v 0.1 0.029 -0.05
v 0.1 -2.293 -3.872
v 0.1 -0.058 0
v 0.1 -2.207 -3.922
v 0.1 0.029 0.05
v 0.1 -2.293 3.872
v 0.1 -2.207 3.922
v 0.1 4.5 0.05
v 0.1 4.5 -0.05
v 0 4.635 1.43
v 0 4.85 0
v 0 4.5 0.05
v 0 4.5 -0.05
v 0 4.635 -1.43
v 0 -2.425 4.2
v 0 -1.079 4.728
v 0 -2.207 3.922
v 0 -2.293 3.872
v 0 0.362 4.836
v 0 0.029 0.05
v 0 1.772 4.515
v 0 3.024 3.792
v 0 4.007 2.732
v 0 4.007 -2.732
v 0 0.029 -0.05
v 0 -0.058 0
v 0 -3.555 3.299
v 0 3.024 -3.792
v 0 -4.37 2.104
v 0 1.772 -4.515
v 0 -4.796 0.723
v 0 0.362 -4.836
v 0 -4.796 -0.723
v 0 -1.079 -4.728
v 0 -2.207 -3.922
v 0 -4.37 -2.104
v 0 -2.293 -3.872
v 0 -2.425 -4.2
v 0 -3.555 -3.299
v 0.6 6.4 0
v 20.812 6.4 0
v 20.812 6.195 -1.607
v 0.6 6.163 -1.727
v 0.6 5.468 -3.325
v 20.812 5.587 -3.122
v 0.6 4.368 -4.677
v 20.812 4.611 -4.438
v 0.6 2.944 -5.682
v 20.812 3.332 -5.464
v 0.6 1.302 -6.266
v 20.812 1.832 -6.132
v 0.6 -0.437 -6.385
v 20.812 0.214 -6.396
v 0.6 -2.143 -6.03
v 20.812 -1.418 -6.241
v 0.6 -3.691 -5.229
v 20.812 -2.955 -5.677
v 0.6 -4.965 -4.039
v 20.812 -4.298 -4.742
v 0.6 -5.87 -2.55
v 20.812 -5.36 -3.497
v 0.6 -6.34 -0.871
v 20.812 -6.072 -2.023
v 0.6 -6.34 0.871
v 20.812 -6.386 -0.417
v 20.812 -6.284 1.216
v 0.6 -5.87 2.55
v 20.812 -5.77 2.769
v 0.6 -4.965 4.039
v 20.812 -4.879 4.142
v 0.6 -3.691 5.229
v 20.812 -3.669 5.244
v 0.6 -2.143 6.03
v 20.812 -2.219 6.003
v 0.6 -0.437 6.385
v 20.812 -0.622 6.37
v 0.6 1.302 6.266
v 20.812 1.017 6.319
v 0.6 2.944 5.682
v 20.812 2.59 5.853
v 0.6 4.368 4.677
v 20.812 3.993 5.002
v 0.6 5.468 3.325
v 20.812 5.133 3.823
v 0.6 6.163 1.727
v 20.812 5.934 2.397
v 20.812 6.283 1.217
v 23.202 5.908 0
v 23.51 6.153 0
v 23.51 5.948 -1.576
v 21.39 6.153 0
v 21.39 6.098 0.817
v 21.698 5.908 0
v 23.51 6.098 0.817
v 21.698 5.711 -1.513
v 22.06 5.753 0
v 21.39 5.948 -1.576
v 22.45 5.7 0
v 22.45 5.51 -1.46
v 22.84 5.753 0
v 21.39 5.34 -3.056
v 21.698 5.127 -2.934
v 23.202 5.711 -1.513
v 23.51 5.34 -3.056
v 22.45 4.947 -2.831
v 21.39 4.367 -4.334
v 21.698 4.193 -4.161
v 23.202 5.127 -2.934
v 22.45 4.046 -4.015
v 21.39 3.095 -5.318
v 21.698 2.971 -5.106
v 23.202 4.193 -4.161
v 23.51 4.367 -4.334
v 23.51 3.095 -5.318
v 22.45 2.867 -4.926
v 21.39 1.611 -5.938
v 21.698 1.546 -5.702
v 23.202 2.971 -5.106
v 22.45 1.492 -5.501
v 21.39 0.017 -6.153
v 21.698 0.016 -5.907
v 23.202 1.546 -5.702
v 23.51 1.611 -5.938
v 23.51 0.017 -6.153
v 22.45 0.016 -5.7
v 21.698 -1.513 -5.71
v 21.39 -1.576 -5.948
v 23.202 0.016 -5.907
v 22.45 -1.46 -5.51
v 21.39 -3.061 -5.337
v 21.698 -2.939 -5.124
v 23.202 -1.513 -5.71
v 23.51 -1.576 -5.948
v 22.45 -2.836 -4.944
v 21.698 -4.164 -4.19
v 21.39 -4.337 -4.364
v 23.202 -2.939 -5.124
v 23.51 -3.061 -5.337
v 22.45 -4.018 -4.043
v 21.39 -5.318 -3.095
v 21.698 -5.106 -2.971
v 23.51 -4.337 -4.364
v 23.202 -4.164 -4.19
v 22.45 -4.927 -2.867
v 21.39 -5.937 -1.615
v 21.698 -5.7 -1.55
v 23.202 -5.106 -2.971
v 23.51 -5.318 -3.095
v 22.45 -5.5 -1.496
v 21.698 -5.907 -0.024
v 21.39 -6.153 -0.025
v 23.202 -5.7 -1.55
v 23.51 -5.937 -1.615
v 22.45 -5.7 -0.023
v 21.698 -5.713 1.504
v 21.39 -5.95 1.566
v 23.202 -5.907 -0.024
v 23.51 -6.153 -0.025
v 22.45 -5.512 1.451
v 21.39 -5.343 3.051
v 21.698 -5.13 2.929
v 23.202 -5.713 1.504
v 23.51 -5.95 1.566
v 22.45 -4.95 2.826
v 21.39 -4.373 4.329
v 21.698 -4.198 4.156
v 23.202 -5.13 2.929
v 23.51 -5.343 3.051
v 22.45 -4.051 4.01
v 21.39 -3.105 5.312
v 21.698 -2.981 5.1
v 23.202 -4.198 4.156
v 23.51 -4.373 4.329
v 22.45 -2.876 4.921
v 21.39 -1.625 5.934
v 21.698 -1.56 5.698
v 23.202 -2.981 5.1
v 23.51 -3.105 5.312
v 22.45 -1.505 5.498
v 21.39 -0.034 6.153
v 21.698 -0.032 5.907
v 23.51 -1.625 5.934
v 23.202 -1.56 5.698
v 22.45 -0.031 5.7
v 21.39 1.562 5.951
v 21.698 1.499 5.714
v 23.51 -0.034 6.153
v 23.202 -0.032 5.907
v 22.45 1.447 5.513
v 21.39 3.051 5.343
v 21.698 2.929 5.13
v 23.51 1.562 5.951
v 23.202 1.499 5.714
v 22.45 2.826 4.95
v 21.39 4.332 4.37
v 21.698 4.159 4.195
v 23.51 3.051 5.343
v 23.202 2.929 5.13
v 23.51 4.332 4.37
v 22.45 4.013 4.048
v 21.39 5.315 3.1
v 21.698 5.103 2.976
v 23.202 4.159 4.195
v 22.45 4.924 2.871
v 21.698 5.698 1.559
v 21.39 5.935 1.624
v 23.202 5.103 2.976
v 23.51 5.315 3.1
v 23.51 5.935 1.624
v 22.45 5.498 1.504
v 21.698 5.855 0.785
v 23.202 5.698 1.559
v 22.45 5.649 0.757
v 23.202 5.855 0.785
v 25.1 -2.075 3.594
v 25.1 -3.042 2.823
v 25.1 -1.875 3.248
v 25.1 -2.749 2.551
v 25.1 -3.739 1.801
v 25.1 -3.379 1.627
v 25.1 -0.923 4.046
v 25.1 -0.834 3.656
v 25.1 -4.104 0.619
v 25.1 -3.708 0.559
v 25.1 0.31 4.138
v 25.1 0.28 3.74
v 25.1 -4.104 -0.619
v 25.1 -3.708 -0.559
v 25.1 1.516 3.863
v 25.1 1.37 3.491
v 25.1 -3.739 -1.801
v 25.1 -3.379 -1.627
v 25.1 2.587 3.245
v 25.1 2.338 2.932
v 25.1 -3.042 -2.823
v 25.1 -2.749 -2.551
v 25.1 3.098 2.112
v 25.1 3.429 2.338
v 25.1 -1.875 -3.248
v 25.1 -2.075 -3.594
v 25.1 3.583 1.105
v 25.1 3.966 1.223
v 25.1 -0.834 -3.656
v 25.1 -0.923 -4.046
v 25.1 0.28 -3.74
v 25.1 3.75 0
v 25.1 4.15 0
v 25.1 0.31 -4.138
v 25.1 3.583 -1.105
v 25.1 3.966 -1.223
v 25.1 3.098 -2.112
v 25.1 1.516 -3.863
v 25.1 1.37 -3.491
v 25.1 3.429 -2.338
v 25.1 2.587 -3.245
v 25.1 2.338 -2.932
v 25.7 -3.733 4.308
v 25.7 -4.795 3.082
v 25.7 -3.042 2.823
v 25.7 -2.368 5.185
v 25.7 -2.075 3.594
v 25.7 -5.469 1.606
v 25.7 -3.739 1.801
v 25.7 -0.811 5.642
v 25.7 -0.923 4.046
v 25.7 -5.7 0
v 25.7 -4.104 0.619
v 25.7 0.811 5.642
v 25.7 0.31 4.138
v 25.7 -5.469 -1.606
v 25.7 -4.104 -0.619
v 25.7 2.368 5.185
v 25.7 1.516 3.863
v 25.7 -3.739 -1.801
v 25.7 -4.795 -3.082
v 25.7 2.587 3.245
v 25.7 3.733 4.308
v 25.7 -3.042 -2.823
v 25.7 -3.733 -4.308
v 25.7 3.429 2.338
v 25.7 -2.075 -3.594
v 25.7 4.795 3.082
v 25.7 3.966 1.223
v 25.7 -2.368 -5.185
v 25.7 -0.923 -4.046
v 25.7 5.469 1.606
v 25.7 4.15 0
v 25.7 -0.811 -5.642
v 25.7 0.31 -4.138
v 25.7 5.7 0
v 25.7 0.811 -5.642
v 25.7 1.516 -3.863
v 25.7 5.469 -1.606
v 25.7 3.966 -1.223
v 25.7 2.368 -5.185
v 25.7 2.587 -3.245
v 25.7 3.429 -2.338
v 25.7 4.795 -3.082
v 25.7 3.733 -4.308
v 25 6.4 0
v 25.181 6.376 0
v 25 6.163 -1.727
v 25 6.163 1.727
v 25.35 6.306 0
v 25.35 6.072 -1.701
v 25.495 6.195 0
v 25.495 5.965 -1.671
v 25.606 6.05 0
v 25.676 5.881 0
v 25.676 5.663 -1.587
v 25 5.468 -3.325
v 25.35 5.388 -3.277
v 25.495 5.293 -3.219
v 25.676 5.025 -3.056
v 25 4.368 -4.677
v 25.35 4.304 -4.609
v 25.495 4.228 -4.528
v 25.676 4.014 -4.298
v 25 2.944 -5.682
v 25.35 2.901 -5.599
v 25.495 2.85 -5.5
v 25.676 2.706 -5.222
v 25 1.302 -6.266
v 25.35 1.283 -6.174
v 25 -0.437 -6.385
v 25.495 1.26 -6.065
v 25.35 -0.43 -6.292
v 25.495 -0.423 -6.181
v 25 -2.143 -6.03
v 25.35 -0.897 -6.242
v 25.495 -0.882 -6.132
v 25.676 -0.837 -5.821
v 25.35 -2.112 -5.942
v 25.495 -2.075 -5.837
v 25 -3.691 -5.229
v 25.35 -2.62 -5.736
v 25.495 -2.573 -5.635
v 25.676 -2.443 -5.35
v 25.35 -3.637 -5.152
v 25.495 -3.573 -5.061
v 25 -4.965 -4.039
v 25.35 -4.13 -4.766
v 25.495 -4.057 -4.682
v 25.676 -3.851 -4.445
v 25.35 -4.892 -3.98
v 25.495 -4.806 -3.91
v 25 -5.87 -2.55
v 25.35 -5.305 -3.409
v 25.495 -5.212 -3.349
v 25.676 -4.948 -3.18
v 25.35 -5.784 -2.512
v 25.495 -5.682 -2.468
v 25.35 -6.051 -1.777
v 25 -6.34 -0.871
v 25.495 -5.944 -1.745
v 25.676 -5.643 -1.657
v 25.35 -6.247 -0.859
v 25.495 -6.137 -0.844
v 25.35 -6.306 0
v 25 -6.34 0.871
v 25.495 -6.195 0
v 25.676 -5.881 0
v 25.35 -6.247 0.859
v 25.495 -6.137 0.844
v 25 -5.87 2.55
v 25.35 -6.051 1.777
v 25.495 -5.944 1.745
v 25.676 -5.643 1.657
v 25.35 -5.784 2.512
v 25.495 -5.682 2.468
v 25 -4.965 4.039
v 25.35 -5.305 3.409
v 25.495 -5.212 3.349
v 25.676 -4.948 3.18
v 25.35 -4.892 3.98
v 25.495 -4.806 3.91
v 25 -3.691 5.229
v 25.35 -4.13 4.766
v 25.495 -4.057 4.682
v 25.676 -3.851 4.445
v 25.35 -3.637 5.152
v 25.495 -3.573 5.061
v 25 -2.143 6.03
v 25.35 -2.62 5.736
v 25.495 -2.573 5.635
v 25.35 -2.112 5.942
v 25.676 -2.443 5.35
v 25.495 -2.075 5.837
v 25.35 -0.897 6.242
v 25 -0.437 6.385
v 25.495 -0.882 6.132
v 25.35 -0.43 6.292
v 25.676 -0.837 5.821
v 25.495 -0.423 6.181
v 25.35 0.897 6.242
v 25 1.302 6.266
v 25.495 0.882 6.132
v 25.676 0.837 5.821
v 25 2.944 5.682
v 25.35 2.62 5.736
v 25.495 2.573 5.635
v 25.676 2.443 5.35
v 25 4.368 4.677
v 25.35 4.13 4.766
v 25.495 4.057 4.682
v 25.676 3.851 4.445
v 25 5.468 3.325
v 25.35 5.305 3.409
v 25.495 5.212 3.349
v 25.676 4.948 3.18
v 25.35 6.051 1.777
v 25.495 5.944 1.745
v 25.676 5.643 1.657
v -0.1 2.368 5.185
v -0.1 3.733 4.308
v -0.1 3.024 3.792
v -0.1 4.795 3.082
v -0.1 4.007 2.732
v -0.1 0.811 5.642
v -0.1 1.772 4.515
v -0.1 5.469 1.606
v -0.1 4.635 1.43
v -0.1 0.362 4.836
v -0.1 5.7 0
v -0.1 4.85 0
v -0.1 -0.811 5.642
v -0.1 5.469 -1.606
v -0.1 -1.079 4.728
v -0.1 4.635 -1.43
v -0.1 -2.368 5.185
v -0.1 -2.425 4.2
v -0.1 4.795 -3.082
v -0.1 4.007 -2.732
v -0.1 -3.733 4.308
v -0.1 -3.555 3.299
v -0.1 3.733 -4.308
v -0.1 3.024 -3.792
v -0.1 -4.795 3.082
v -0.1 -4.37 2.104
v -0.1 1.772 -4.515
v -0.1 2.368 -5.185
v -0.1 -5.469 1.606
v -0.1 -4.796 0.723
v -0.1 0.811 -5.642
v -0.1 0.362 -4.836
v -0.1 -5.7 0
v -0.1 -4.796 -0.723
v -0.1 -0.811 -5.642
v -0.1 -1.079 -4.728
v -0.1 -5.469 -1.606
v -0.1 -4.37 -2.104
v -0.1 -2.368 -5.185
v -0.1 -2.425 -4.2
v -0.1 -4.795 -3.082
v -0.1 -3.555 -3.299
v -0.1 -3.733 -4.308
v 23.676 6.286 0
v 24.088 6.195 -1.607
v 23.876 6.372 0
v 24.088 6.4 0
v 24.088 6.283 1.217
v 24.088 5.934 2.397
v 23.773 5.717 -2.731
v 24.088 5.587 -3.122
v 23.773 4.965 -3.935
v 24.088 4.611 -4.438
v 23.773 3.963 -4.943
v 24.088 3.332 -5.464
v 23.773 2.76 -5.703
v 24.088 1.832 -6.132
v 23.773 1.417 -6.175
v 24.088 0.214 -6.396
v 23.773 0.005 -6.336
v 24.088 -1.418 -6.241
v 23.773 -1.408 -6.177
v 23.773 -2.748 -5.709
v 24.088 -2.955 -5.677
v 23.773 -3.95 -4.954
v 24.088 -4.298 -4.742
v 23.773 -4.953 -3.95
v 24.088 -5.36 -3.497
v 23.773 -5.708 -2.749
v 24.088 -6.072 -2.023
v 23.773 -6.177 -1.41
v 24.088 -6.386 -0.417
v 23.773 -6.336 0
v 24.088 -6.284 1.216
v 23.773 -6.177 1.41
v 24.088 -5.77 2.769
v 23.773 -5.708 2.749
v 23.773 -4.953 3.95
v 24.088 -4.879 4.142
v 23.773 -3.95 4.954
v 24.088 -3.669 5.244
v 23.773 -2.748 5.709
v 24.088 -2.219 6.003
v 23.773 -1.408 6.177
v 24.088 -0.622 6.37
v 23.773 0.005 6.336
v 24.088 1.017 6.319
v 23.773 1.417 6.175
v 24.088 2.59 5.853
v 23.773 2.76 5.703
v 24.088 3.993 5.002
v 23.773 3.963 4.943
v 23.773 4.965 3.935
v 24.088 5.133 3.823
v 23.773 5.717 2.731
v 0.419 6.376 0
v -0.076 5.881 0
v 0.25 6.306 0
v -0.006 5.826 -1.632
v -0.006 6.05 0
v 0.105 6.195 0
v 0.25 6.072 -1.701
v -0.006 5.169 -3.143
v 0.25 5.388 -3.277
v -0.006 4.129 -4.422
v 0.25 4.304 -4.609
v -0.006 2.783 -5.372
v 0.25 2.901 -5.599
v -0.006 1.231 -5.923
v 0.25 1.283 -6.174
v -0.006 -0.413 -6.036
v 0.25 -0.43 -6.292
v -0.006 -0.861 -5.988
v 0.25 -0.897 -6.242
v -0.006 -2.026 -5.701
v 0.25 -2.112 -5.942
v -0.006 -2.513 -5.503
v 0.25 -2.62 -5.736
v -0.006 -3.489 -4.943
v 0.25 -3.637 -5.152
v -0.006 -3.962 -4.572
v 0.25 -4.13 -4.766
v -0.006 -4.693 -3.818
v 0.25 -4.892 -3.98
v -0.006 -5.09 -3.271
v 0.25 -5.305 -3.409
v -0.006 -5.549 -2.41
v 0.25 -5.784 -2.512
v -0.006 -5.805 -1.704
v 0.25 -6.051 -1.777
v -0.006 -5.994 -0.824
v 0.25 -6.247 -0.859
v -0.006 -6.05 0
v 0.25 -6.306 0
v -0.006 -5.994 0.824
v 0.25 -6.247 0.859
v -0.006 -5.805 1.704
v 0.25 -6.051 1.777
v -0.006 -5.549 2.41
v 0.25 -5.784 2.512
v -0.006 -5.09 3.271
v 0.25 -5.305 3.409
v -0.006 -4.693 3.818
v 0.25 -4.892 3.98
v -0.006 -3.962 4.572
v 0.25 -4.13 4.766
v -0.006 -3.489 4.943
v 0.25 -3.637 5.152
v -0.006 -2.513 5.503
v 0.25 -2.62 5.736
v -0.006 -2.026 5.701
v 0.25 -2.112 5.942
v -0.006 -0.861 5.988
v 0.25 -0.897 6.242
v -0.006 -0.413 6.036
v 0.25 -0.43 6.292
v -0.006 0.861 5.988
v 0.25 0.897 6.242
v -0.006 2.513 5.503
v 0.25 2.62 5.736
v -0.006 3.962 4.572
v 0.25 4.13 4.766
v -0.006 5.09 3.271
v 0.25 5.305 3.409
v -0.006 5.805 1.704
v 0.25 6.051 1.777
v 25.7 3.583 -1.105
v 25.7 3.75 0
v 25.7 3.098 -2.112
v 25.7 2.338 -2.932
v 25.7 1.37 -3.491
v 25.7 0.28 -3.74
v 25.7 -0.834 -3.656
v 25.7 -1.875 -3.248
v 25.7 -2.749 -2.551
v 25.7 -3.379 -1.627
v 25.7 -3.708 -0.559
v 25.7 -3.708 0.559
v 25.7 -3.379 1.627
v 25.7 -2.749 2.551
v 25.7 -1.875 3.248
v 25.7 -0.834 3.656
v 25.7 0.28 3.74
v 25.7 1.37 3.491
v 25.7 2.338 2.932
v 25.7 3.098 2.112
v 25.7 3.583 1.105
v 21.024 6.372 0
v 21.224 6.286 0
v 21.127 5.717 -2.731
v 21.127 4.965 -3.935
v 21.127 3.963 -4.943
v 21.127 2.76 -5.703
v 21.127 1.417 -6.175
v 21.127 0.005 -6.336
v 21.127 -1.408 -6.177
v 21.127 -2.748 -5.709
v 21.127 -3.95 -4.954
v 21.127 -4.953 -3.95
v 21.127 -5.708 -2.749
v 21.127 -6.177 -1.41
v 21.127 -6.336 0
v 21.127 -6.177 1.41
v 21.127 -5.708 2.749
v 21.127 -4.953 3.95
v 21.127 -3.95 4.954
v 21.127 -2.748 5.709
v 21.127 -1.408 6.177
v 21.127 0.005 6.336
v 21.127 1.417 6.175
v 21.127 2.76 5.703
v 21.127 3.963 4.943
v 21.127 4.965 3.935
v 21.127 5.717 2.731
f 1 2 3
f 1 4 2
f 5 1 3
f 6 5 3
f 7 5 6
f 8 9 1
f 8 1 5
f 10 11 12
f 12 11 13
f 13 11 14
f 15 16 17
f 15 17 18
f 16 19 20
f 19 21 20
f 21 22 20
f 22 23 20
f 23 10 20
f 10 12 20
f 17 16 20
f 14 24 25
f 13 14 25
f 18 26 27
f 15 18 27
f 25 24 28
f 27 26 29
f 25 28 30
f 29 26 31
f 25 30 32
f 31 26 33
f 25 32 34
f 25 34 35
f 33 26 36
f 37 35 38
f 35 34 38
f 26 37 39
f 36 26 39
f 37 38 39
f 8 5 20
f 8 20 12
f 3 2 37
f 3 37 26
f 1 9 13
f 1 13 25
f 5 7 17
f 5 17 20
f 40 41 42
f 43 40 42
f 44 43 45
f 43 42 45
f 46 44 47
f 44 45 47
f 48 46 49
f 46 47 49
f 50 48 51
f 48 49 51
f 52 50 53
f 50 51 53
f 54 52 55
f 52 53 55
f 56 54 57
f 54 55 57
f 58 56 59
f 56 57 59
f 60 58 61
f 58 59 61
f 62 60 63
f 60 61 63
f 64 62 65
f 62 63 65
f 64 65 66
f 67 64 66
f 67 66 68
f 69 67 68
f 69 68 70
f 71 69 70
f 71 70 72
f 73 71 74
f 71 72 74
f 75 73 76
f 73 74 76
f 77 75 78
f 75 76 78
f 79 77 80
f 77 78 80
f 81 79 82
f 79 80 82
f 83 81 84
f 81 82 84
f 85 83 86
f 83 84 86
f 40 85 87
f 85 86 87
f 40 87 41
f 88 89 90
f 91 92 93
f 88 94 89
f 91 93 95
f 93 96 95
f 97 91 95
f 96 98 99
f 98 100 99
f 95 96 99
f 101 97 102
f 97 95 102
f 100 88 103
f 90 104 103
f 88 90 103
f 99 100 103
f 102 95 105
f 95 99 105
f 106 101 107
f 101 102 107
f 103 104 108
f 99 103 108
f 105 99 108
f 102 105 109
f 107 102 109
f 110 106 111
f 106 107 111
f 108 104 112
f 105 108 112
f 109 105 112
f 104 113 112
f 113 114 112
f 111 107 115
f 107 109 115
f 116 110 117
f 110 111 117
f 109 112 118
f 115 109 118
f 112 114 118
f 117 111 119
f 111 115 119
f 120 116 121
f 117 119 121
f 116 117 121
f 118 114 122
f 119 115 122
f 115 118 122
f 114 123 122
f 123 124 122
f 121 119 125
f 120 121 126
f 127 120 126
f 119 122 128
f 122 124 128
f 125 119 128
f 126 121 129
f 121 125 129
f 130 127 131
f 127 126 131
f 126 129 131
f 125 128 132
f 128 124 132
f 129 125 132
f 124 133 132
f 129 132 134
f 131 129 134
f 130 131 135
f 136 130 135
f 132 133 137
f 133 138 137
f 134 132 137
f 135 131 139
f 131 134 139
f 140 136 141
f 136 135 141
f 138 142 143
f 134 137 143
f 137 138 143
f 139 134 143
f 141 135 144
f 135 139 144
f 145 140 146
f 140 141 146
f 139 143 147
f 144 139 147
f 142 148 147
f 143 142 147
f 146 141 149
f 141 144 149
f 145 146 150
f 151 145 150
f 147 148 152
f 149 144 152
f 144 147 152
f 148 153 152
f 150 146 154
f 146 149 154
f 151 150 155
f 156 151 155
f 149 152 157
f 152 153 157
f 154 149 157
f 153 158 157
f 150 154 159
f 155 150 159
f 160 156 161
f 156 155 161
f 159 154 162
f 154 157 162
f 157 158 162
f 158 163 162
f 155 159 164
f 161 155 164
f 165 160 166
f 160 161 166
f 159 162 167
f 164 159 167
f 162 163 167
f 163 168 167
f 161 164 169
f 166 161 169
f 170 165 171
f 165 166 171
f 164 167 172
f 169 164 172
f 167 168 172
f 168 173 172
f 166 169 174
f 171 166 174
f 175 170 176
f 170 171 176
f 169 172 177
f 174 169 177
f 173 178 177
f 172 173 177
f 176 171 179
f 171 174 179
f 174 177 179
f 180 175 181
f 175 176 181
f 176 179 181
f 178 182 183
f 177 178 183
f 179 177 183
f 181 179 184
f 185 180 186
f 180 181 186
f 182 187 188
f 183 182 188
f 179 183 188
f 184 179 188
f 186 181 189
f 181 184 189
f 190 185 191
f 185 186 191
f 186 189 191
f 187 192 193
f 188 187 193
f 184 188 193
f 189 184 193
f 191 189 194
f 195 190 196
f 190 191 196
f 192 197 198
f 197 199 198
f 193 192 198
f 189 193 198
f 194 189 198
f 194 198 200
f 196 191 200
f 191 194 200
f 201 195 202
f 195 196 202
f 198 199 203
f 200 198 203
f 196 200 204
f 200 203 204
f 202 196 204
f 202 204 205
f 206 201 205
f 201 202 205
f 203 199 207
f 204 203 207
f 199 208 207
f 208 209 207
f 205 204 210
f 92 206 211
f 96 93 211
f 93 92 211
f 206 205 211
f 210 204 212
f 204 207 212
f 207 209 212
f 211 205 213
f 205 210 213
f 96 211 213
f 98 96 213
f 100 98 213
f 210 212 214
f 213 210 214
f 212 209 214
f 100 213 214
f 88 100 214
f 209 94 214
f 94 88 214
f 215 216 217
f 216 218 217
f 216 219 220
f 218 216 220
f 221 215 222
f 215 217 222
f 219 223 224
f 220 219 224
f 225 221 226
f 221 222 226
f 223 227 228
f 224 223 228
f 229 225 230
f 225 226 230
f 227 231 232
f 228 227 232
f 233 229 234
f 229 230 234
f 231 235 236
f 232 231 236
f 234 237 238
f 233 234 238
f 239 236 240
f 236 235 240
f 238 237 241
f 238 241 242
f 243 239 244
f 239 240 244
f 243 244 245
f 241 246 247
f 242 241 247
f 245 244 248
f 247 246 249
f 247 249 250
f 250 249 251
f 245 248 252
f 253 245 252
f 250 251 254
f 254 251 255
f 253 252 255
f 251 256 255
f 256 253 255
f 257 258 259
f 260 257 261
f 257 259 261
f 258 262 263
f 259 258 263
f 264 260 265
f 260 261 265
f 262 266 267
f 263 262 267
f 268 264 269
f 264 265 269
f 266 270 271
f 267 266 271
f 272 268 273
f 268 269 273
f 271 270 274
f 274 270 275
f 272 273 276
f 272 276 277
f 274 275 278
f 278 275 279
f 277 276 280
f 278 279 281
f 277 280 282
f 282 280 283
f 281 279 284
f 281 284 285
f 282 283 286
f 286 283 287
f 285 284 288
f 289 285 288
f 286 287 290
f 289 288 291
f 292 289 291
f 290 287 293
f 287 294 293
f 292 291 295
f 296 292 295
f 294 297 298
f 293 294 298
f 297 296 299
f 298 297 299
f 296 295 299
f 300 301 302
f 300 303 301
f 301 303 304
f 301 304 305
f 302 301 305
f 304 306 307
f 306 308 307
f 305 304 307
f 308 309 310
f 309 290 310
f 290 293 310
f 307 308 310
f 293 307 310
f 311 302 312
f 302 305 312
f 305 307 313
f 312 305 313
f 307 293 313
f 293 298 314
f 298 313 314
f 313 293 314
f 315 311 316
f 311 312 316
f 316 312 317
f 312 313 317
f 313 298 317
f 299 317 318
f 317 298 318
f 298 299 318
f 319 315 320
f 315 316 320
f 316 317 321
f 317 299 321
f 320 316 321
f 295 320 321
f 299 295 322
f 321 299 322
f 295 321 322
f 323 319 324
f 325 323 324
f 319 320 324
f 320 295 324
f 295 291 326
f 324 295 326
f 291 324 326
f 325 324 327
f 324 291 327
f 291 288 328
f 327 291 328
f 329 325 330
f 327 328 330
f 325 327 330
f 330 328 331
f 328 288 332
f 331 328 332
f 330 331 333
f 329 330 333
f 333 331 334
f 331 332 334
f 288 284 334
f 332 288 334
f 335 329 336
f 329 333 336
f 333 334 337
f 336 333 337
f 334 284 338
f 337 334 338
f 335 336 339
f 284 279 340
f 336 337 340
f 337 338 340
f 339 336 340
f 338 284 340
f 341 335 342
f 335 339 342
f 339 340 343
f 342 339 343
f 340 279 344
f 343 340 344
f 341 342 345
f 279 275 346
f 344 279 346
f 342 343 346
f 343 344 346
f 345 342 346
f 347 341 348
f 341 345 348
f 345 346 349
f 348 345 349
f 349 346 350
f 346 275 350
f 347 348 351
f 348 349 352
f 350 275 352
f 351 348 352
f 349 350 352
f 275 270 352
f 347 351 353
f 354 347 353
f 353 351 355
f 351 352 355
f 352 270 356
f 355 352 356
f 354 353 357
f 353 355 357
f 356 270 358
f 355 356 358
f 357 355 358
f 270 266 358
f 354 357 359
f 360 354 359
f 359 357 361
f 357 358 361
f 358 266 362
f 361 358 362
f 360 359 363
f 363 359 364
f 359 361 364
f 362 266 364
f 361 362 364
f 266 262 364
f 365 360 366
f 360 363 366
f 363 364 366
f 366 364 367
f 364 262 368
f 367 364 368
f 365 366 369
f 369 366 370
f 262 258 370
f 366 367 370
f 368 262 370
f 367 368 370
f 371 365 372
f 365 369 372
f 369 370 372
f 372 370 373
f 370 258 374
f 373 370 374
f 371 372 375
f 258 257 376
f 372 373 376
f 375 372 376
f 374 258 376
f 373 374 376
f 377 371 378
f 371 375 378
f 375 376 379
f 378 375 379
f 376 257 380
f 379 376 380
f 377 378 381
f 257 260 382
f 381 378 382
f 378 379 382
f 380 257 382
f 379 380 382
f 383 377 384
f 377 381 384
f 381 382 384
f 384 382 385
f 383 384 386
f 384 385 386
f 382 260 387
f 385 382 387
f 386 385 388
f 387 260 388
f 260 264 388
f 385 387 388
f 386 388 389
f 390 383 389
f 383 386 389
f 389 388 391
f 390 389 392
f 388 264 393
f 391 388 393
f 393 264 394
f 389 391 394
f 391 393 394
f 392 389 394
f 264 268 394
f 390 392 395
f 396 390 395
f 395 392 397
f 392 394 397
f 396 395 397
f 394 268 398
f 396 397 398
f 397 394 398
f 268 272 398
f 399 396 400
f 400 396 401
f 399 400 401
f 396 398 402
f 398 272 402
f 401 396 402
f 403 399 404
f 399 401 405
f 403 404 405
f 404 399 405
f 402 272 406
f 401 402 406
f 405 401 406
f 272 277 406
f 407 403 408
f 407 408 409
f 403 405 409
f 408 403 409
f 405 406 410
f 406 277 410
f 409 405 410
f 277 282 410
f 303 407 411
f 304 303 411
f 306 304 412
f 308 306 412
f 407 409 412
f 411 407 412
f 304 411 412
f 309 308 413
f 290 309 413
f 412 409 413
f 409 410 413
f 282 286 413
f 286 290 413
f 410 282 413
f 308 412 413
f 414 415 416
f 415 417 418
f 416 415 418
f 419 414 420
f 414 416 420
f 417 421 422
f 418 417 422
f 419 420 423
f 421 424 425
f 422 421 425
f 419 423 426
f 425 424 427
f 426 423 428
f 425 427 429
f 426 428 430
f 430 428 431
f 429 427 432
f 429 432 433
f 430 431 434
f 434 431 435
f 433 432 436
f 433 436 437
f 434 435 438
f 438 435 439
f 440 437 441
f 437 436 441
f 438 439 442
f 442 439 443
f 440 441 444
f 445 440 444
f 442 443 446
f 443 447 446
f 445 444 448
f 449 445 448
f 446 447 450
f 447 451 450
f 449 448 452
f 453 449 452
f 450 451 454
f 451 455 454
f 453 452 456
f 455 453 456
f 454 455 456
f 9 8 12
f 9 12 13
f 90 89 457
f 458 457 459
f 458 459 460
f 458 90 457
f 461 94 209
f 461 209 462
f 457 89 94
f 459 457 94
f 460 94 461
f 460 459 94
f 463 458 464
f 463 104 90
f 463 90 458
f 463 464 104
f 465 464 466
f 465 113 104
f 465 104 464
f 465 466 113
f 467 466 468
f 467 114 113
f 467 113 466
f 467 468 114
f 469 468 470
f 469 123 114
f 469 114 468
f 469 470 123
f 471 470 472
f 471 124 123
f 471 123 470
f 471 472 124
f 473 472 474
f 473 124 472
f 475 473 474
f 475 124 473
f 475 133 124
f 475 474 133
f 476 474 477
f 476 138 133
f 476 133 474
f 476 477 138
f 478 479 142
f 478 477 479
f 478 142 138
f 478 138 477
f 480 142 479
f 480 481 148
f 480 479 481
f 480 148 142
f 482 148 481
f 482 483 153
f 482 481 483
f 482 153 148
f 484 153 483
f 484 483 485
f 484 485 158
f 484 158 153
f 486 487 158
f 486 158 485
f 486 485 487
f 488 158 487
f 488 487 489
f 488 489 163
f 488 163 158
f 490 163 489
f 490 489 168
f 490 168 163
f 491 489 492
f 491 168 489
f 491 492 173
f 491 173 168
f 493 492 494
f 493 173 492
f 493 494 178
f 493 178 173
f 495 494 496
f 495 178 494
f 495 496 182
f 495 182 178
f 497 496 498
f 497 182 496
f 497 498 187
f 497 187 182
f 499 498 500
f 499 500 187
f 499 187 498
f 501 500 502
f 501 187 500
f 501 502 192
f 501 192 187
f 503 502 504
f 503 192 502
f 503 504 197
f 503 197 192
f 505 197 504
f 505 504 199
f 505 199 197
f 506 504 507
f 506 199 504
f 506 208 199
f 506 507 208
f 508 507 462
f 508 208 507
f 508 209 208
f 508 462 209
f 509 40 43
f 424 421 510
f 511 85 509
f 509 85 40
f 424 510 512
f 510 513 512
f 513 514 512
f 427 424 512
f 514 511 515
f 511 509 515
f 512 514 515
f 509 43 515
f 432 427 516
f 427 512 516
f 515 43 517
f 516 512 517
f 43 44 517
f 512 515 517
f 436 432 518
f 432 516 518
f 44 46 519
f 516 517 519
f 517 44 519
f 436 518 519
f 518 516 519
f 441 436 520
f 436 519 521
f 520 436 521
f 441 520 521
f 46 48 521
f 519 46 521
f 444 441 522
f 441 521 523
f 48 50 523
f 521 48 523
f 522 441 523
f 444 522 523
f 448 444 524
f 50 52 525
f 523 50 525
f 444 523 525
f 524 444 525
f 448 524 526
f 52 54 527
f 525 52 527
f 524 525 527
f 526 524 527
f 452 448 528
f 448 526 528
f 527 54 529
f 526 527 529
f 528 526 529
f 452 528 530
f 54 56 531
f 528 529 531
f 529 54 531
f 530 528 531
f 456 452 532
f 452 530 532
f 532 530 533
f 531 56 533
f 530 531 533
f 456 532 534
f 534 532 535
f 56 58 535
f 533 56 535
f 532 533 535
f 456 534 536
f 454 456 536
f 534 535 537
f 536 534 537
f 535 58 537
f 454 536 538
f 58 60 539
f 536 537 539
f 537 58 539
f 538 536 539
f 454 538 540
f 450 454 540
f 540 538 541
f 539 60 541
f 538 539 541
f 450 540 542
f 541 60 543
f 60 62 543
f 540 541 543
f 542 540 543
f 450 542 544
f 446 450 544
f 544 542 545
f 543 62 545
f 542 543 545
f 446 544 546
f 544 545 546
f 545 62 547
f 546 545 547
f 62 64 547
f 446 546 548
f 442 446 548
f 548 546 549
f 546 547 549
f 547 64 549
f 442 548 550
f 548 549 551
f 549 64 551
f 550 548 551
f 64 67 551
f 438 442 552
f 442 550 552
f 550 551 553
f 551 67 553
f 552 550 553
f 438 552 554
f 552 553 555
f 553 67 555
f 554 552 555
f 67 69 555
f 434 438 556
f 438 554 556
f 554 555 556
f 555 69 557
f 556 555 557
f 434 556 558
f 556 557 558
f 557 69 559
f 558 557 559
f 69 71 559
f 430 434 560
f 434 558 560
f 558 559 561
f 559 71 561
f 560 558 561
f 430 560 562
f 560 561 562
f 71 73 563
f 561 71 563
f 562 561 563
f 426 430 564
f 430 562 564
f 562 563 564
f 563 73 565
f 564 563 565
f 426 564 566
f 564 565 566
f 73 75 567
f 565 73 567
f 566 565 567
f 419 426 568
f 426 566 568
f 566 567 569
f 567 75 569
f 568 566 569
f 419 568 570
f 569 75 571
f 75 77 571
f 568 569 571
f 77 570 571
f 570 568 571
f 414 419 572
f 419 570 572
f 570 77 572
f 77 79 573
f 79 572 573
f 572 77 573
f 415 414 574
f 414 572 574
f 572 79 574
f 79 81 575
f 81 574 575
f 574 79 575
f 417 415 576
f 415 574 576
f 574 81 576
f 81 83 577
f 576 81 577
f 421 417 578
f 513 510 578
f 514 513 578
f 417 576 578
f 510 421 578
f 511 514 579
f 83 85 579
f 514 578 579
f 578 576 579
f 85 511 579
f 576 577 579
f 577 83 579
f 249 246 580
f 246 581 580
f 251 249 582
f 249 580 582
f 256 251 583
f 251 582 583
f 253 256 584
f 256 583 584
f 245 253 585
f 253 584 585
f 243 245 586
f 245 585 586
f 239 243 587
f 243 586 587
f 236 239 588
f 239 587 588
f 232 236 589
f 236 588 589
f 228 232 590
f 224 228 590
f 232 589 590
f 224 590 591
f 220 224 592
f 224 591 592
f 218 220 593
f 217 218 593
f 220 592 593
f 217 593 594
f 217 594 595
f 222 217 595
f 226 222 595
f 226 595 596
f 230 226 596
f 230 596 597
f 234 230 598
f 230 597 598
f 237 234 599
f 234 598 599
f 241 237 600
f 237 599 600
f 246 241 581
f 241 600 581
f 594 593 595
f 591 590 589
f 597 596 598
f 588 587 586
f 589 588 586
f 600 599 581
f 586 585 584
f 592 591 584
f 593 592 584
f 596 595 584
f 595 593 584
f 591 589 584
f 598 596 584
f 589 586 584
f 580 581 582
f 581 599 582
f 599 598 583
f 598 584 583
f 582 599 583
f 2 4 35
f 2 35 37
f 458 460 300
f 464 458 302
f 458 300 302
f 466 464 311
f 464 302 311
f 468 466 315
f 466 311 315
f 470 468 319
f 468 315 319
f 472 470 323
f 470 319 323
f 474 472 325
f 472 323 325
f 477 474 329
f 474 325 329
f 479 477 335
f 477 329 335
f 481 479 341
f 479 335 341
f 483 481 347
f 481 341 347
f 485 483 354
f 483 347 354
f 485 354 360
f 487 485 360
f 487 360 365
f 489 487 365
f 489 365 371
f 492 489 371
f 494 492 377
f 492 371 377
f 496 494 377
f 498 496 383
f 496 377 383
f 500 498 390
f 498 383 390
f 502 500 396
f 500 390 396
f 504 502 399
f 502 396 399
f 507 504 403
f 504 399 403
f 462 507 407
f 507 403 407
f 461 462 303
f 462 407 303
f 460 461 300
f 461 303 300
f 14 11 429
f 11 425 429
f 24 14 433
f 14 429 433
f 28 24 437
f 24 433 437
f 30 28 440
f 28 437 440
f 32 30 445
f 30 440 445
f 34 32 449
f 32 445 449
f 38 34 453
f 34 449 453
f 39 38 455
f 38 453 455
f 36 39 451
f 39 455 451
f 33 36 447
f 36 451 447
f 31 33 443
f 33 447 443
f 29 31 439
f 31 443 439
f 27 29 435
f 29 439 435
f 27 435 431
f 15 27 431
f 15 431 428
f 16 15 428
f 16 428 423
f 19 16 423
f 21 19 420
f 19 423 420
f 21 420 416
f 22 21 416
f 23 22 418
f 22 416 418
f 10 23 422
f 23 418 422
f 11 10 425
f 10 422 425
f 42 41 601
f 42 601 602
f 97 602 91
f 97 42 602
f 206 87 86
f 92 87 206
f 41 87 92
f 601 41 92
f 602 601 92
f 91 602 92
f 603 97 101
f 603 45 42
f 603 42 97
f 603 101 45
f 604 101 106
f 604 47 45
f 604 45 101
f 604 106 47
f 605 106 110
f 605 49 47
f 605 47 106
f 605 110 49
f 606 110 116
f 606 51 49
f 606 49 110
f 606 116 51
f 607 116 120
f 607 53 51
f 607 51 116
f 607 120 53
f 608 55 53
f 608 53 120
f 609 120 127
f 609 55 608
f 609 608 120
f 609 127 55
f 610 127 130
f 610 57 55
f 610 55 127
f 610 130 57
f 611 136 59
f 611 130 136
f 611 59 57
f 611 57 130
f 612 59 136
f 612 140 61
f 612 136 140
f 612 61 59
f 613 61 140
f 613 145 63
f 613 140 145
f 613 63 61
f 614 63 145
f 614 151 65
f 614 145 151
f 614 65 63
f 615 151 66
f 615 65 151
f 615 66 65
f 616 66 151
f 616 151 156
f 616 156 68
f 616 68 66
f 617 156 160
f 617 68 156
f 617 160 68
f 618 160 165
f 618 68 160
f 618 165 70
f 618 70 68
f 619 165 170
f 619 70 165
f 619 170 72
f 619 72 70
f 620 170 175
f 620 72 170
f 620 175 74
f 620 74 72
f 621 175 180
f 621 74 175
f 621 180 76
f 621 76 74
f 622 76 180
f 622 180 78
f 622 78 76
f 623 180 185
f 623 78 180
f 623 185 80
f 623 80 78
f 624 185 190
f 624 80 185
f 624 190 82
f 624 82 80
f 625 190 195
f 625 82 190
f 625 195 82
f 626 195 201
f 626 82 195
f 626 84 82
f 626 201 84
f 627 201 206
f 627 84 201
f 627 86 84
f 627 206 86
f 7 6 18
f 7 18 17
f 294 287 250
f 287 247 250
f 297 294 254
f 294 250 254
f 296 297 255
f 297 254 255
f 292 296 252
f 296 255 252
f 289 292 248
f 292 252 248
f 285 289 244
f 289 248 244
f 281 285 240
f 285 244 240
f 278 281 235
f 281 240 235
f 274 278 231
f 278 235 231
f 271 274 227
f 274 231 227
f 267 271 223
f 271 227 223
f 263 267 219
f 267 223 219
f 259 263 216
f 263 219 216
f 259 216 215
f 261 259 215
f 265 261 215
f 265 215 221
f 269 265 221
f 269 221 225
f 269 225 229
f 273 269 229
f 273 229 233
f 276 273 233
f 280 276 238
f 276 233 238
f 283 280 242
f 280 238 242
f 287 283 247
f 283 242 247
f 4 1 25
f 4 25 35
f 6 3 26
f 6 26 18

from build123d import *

# Parameters (mm, degrees)
FILLET_1_R          = 0.7
FILLET_4_R          = 0.8
CUT_EXTRUDE_START   = -0.1
CUT_EXTRUDE_3_DEPTH = 0.1


# Read off the part's stored shape, not the designer's step: Вырез-Вытянуть-Тонкостенный3
with BuildPart() as part:
    # Эскиз2 → Повернуть1 (revolve)
    with BuildSketch(Plane.XY):
        with BuildLine():
            Line((0, 0), (0, 4.85))
            Line((0, 4.85), (-0.1, 4.85))
            Line((-0.1, 4.85), (-0.1, 6.4))
            Line((-0.1, 6.4), (21.2, 6.4))
            ThreePointArc((21.2, 6.4), (22.45, 5.7), (23.7, 6.4))
            Line((23.7, 6.4), (25.7, 6.4))
            Line((25.7, 6.4), (25.7, 4.15))
            Line((25.7, 4.15), (25.1, 4.15))
            Line((25.1, 4.15), (25.1, 3.75))
            Line((25.1, 3.75), (25.7, 3.75))
            Line((25.7, 3.75), (25.7, 0))
            Line((25.7, 0), (0, 0))
        make_face()
    revolve(axis=Axis((25.7, 0, 0), (-1, 0, 0)))

    # Скругление1
    fillet_1_edges = [part.edges().sort_by_distance(p)[0] for p in [
        (25.7, -6.4, 0),
        (-0.1, -6.4, 0),
    ]]
    fillet(fillet_1_edges, radius=FILLET_1_R)

    # Скругление4
    fillet_4_edges = [part.edges().sort_by_distance(p)[0] for p in [
        (21.2, -6.4, 0),
        (23.7, -6.4, 0),
    ]]
    fillet(fillet_4_edges, radius=FILLET_4_R)

    # Вырез-Вытянуть-Тонкостенный3 outline → Вырез-Вытянуть-Тонкостенный3 (cut)
    with BuildSketch(Plane.ZY.offset(CUT_EXTRUDE_START)):
        Polygon((-3.872114317, -2.29330127), (0, -0.057735027), (3.872114317, -2.29330127), (3.922114317, -2.20669873), (0.05, 0.028867513), (0.05, 4.5), (-0.05, 4.5), (-0.05, 0.028867513), (-3.922114317, -2.20669873), align=None)
    extrude(amount=CUT_EXTRUDE_3_DEPTH, mode=Mode.SUBTRACT)


solid = part.part
